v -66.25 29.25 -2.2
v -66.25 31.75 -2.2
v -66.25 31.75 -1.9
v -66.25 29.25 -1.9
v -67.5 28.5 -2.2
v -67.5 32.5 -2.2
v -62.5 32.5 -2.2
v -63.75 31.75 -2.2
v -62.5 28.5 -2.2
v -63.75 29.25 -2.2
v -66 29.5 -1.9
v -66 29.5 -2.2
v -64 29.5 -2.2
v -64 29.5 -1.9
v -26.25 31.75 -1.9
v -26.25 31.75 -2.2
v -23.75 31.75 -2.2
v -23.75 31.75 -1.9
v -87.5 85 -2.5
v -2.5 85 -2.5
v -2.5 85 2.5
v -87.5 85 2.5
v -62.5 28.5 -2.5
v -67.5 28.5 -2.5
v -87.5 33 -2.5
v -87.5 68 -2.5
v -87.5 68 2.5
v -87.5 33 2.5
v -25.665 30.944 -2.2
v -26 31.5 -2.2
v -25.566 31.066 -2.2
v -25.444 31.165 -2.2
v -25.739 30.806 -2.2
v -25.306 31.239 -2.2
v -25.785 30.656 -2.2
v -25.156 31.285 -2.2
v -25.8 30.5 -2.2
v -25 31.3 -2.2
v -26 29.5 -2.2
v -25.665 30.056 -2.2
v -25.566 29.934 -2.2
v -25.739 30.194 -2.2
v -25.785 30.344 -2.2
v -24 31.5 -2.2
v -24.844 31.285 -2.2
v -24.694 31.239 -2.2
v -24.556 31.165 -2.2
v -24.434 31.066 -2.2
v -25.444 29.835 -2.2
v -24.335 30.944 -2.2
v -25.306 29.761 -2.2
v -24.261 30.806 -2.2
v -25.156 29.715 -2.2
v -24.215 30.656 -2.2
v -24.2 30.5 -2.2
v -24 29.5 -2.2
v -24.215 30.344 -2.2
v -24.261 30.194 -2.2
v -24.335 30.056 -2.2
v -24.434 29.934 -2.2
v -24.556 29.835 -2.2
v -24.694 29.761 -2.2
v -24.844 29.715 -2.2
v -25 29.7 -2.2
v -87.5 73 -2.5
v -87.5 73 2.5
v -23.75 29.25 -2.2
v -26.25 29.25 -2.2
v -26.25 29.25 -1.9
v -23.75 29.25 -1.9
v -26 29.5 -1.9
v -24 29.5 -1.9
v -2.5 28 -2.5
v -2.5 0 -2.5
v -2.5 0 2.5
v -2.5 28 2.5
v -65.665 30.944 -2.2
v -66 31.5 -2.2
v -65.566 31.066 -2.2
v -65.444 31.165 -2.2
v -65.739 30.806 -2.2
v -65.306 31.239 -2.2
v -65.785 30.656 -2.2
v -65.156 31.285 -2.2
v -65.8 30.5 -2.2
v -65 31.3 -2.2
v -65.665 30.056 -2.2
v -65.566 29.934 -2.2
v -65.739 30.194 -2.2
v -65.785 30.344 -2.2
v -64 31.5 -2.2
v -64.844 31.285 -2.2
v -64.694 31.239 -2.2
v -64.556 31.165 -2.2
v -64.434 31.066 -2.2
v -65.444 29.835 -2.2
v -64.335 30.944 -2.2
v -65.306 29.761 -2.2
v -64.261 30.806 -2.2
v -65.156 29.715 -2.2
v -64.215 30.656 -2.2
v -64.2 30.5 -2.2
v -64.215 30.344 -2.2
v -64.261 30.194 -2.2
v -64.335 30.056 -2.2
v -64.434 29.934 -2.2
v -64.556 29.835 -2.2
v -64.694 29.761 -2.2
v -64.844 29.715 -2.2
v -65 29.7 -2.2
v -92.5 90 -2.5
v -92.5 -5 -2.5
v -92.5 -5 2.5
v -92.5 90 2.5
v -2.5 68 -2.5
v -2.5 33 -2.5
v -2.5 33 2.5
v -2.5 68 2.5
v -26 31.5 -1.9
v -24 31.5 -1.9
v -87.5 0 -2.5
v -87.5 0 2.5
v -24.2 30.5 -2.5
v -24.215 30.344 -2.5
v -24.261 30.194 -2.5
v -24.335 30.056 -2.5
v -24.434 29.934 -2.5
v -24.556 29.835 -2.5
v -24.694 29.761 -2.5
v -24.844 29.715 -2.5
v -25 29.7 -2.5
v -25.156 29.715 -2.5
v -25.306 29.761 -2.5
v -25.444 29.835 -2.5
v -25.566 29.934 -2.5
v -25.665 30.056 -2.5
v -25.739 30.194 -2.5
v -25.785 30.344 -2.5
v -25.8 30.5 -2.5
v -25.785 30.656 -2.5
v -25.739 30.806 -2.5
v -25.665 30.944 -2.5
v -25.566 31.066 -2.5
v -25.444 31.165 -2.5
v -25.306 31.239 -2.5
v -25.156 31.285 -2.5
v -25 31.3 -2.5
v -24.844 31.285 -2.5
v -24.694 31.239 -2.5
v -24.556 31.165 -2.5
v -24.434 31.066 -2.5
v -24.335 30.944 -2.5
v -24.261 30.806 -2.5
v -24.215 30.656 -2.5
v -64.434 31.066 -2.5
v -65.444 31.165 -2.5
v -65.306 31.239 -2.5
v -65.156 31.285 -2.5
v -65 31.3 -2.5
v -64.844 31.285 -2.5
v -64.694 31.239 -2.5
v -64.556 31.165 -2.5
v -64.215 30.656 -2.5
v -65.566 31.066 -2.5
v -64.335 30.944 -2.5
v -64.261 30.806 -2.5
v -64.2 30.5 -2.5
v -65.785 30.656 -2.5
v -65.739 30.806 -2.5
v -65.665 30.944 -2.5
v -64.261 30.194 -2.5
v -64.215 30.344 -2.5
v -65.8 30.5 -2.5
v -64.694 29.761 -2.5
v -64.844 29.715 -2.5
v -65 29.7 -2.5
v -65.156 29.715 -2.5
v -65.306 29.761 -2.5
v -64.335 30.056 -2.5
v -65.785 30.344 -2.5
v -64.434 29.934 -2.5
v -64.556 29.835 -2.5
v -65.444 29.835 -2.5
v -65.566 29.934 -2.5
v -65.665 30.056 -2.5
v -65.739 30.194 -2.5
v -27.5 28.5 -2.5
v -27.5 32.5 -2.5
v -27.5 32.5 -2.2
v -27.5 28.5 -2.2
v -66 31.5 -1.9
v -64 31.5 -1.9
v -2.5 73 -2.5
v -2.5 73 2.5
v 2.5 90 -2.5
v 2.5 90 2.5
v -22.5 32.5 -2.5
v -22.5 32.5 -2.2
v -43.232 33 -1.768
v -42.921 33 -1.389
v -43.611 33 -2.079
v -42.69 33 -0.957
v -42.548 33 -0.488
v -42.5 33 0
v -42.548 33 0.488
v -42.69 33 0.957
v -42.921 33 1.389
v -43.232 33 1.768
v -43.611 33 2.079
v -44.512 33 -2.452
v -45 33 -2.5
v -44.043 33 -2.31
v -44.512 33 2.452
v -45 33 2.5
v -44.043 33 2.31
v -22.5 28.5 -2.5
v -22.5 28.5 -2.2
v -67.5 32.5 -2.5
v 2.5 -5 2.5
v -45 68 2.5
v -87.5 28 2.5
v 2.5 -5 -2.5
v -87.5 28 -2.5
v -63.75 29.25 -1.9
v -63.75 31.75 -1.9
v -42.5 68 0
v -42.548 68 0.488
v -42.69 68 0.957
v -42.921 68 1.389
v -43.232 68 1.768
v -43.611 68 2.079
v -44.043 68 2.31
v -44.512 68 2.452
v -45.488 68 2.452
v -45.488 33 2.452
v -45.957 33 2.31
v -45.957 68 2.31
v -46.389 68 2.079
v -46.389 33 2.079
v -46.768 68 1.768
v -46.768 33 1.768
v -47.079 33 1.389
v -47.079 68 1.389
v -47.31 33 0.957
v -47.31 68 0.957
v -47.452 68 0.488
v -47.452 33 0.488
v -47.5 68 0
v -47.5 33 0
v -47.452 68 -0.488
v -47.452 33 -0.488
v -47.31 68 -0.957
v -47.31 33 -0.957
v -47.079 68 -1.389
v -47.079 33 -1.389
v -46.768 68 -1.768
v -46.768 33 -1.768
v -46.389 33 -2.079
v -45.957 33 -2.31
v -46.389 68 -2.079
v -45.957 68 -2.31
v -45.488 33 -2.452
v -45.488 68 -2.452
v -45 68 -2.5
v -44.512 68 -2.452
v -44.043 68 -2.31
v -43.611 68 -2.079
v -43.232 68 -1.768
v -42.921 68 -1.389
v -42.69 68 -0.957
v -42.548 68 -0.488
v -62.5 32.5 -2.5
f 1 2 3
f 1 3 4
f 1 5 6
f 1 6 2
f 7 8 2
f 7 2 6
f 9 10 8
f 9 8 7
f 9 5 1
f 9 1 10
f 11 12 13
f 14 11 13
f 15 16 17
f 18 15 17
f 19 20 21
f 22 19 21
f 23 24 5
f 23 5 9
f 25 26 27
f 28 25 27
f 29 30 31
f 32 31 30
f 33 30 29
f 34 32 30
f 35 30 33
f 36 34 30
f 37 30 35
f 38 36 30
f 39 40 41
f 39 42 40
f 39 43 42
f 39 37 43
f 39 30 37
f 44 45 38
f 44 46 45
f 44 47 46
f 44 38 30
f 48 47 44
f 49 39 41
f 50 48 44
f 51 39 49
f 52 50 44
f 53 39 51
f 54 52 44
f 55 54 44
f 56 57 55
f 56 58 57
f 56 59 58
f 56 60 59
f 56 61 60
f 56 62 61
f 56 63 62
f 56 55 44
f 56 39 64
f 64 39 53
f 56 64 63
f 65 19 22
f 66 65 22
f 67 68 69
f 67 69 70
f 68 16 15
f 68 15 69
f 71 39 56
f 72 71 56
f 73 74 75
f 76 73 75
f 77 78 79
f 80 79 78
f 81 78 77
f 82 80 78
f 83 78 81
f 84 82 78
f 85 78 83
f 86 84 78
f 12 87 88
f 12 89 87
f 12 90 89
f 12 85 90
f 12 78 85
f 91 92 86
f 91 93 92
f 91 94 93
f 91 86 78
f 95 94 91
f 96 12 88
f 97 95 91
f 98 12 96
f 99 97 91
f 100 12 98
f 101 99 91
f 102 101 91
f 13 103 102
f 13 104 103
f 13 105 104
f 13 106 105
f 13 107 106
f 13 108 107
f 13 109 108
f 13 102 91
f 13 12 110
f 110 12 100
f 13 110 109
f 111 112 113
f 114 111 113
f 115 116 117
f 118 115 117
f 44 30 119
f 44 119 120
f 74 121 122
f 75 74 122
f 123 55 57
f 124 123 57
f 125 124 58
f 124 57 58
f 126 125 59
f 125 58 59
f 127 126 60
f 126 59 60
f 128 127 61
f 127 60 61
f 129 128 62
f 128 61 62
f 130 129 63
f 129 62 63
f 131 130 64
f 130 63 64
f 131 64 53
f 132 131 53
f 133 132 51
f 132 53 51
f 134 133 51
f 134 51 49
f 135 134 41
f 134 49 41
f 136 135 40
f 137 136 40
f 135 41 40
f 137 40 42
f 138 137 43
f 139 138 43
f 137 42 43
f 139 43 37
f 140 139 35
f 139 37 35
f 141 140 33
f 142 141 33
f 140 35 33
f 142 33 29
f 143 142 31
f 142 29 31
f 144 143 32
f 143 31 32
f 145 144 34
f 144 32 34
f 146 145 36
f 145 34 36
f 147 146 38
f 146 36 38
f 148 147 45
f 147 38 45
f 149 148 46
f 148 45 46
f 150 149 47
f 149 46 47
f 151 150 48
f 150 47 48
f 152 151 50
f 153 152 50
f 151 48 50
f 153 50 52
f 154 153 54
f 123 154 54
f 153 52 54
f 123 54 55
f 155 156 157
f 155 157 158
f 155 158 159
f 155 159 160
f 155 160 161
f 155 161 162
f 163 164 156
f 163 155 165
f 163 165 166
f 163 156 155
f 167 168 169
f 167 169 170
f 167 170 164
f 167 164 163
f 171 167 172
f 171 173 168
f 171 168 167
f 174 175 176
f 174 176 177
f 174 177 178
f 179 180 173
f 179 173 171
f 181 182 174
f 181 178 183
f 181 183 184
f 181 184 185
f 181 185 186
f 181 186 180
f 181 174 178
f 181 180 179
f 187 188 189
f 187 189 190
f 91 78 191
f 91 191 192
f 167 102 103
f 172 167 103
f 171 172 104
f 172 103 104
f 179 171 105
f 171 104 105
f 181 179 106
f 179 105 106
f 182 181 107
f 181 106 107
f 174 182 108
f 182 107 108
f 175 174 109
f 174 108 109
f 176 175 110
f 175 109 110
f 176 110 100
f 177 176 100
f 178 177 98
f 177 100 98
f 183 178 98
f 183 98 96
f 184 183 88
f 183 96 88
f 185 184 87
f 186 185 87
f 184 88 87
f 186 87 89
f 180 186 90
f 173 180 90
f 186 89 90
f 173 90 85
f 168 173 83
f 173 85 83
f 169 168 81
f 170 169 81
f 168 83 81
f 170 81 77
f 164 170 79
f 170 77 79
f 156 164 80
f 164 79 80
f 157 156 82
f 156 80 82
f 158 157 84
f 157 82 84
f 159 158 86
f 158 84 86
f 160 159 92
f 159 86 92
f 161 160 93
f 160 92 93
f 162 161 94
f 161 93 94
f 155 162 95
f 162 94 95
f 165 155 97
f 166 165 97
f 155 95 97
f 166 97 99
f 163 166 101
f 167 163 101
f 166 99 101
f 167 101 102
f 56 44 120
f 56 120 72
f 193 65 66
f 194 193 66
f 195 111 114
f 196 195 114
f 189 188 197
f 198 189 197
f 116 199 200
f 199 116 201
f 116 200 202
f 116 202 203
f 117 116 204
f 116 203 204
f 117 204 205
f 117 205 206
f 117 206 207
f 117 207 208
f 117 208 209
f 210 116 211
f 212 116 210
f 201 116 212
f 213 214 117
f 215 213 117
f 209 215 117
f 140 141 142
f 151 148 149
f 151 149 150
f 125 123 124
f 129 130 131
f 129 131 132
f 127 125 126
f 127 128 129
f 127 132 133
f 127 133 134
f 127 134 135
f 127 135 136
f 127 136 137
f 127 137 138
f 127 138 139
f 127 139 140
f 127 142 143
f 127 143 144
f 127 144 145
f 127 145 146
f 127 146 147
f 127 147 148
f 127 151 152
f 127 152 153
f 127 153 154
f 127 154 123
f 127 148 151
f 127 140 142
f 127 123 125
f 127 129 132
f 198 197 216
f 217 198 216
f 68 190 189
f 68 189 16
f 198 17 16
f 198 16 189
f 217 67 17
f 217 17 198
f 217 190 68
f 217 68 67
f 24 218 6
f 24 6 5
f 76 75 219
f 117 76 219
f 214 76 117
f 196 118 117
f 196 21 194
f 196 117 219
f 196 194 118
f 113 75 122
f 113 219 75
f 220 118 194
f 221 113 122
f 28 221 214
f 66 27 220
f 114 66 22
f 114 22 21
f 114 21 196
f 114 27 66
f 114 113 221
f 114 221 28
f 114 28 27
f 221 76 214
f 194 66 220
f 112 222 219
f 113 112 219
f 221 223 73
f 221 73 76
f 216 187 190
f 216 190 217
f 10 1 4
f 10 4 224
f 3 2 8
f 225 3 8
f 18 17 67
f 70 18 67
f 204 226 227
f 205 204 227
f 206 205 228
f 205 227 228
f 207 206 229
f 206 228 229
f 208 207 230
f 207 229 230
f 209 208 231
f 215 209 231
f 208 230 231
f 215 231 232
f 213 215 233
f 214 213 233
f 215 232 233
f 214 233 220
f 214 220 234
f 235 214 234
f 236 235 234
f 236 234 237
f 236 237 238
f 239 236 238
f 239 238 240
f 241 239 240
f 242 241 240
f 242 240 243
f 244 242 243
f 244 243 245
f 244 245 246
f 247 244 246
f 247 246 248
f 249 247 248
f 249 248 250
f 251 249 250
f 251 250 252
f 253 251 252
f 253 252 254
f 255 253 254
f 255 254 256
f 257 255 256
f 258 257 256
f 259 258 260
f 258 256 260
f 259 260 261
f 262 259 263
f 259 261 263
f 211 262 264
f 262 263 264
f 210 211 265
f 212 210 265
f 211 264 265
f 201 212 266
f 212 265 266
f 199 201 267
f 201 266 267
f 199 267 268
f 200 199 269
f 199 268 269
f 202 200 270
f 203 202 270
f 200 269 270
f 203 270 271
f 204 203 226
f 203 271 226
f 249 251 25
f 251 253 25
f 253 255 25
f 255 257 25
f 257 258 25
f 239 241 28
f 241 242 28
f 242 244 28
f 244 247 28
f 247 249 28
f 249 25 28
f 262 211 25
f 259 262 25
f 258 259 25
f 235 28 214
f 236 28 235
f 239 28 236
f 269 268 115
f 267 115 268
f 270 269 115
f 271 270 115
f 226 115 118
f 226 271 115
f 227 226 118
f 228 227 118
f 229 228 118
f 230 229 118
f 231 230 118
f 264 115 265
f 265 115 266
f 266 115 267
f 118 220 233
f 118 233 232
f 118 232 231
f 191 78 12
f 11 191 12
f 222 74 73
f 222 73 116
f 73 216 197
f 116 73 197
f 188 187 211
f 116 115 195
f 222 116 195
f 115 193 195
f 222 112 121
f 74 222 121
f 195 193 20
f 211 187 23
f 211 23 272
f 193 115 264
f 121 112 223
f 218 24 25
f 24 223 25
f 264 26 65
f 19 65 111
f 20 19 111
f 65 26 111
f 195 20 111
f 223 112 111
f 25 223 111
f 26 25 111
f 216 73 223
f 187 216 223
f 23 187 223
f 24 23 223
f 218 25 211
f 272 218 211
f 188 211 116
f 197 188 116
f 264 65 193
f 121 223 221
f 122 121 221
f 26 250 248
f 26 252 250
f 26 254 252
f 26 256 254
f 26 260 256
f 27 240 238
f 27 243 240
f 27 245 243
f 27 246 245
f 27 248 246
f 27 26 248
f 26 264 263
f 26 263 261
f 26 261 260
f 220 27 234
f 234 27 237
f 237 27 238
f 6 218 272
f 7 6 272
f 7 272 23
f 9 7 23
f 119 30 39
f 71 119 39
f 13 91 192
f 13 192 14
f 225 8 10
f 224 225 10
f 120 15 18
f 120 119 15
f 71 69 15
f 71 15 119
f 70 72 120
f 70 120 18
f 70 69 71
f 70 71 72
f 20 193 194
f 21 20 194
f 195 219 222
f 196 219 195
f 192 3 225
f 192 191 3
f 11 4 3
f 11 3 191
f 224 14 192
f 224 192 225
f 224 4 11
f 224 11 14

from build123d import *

# Parameters (mm, degrees)
F0_W      = 5
F0_H      = 5
F1_DEPTH  = 90
F2_W      = 5
F2_H      = 5
F3_DEPTH  = 90
F4_W      = 5
F4_H      = 5
F5_DEPTH  = 90
F6_W      = 5
F6_H      = 5
F7_DEPTH  = 90
F8_W      = 5
F8_H      = 5
F9_DEPTH  = 90
F10_R     = 2.5
F11_DEPTH = 35
F12_W     = 5
F12_H     = 5
F13_DEPTH = 85
F14_W     = 5
F14_H     = 4
F15_DEPTH = 0.3
F16_R     = 0.8
F17_DEPTH = 0.3
F18_W     = 2.5
F18_H     = 2.5
F18_W_2   = 2
F18_H_2   = 2
F19_DEPTH = 0.3
F20_R     = 0.8
F21_DEPTH = 0.3
F22_W     = 2.5
F22_H     = 2.5
F22_W_2   = 2
F22_H_2   = 2
F23_DEPTH = 0.3


with BuildPart() as f1:
    # F0 (on Front) → F1 (new body)
    with BuildSketch(Plane.XZ):
        Rectangle(F0_W, F0_H)
    extrude(amount=-F1_DEPTH)

    # F2 (on face) → F3 (join)
    with BuildSketch(Plane(origin=(-2.5, 0, 0), x_dir=(0, -1, 0), z_dir=(-1, 0, 0))):
        with Locations((-87.5, 0)):
            Rectangle(F2_W, F2_H)
    extrude(amount=F3_DEPTH)

    # F4 (on face) → F5 (join)
    with BuildSketch(Plane.XZ.offset(-85)):
        with Locations((-90, 0)):
            Rectangle(F4_W, F4_H)
    extrude(amount=F5_DEPTH)

    # F6 (on face) → F7 (join)
    with BuildSketch(Plane.YZ.offset(-87.5)):
        with Locations((-2.5, 0)):
            Rectangle(F6_W, F6_H)
    extrude(amount=F7_DEPTH)

    # F8 (on face) → F9 (join)
    with BuildSketch(Plane.YZ.offset(-87.5)):
        with Locations((70.5, 0)):
            Rectangle(F8_W, F8_H)
    extrude(amount=F9_DEPTH)

    # F10 (on face) → F11 (join)
    with BuildSketch(Plane.XZ.offset(-68)):
        with Locations((-45, 0)):
            Circle(F10_R)
    extrude(amount=F11_DEPTH)

    # F12 (on face) → F13 (join)
    with BuildSketch(Plane.YZ.offset(-87.5)):
        with Locations((30.5, 0)):
            Rectangle(F12_W, F12_H)
    extrude(amount=F13_DEPTH)

    # F14 (on face) → F15 (cut)
    with BuildSketch(Plane(origin=(0, 0, -2.5), x_dir=(1, 0, 0), z_dir=(0, 0, -1))):
        with Locations((-65, -30.5)):
            Rectangle(F14_W, F14_H)
        with Locations((-25, -30.5)):
            Rectangle(F14_W, F14_H)
    extrude(amount=-F15_DEPTH, mode=Mode.SUBTRACT)

    # F16 (on face) → F17 (join)
    with BuildSketch(Plane(origin=(0, 0, -2.2), x_dir=(1, 0, 0), z_dir=(0, 0, -1))):
        with Locations((-65, -30.5)):
            Circle(F16_R)
    extrude(amount=F17_DEPTH)

    # F18 (on face) → F19 (cut)
    with BuildSketch(Plane(origin=(0, 0, -2.2), x_dir=(1, 0, 0), z_dir=(0, 0, -1))):
        with Locations((-65, -30.5)):
            Rectangle(F18_W, F18_H)
        with Locations((-65, -30.5)):
            Rectangle(F18_W_2, F18_H_2, mode=Mode.SUBTRACT)
    extrude(amount=-F19_DEPTH, mode=Mode.SUBTRACT)

    # F20 (on face) → F21 (join)
    with BuildSketch(Plane(origin=(0, 0, -2.2), x_dir=(1, 0, 0), z_dir=(0, 0, -1))):
        with Locations((-25, -30.5)):
            Circle(F20_R)
    extrude(amount=F21_DEPTH)

    # F22 (on face) → F23 (cut)
    with BuildSketch(Plane(origin=(0, 0, -2.2), x_dir=(1, 0, 0), z_dir=(0, 0, -1))):
        with Locations((-25, -30.5)):
            Rectangle(F22_W, F22_H)
        with Locations((-25, -30.5)):
            Rectangle(F22_W_2, F22_H_2, mode=Mode.SUBTRACT)
    extrude(amount=-F23_DEPTH, mode=Mode.SUBTRACT)


solid = f1.part
